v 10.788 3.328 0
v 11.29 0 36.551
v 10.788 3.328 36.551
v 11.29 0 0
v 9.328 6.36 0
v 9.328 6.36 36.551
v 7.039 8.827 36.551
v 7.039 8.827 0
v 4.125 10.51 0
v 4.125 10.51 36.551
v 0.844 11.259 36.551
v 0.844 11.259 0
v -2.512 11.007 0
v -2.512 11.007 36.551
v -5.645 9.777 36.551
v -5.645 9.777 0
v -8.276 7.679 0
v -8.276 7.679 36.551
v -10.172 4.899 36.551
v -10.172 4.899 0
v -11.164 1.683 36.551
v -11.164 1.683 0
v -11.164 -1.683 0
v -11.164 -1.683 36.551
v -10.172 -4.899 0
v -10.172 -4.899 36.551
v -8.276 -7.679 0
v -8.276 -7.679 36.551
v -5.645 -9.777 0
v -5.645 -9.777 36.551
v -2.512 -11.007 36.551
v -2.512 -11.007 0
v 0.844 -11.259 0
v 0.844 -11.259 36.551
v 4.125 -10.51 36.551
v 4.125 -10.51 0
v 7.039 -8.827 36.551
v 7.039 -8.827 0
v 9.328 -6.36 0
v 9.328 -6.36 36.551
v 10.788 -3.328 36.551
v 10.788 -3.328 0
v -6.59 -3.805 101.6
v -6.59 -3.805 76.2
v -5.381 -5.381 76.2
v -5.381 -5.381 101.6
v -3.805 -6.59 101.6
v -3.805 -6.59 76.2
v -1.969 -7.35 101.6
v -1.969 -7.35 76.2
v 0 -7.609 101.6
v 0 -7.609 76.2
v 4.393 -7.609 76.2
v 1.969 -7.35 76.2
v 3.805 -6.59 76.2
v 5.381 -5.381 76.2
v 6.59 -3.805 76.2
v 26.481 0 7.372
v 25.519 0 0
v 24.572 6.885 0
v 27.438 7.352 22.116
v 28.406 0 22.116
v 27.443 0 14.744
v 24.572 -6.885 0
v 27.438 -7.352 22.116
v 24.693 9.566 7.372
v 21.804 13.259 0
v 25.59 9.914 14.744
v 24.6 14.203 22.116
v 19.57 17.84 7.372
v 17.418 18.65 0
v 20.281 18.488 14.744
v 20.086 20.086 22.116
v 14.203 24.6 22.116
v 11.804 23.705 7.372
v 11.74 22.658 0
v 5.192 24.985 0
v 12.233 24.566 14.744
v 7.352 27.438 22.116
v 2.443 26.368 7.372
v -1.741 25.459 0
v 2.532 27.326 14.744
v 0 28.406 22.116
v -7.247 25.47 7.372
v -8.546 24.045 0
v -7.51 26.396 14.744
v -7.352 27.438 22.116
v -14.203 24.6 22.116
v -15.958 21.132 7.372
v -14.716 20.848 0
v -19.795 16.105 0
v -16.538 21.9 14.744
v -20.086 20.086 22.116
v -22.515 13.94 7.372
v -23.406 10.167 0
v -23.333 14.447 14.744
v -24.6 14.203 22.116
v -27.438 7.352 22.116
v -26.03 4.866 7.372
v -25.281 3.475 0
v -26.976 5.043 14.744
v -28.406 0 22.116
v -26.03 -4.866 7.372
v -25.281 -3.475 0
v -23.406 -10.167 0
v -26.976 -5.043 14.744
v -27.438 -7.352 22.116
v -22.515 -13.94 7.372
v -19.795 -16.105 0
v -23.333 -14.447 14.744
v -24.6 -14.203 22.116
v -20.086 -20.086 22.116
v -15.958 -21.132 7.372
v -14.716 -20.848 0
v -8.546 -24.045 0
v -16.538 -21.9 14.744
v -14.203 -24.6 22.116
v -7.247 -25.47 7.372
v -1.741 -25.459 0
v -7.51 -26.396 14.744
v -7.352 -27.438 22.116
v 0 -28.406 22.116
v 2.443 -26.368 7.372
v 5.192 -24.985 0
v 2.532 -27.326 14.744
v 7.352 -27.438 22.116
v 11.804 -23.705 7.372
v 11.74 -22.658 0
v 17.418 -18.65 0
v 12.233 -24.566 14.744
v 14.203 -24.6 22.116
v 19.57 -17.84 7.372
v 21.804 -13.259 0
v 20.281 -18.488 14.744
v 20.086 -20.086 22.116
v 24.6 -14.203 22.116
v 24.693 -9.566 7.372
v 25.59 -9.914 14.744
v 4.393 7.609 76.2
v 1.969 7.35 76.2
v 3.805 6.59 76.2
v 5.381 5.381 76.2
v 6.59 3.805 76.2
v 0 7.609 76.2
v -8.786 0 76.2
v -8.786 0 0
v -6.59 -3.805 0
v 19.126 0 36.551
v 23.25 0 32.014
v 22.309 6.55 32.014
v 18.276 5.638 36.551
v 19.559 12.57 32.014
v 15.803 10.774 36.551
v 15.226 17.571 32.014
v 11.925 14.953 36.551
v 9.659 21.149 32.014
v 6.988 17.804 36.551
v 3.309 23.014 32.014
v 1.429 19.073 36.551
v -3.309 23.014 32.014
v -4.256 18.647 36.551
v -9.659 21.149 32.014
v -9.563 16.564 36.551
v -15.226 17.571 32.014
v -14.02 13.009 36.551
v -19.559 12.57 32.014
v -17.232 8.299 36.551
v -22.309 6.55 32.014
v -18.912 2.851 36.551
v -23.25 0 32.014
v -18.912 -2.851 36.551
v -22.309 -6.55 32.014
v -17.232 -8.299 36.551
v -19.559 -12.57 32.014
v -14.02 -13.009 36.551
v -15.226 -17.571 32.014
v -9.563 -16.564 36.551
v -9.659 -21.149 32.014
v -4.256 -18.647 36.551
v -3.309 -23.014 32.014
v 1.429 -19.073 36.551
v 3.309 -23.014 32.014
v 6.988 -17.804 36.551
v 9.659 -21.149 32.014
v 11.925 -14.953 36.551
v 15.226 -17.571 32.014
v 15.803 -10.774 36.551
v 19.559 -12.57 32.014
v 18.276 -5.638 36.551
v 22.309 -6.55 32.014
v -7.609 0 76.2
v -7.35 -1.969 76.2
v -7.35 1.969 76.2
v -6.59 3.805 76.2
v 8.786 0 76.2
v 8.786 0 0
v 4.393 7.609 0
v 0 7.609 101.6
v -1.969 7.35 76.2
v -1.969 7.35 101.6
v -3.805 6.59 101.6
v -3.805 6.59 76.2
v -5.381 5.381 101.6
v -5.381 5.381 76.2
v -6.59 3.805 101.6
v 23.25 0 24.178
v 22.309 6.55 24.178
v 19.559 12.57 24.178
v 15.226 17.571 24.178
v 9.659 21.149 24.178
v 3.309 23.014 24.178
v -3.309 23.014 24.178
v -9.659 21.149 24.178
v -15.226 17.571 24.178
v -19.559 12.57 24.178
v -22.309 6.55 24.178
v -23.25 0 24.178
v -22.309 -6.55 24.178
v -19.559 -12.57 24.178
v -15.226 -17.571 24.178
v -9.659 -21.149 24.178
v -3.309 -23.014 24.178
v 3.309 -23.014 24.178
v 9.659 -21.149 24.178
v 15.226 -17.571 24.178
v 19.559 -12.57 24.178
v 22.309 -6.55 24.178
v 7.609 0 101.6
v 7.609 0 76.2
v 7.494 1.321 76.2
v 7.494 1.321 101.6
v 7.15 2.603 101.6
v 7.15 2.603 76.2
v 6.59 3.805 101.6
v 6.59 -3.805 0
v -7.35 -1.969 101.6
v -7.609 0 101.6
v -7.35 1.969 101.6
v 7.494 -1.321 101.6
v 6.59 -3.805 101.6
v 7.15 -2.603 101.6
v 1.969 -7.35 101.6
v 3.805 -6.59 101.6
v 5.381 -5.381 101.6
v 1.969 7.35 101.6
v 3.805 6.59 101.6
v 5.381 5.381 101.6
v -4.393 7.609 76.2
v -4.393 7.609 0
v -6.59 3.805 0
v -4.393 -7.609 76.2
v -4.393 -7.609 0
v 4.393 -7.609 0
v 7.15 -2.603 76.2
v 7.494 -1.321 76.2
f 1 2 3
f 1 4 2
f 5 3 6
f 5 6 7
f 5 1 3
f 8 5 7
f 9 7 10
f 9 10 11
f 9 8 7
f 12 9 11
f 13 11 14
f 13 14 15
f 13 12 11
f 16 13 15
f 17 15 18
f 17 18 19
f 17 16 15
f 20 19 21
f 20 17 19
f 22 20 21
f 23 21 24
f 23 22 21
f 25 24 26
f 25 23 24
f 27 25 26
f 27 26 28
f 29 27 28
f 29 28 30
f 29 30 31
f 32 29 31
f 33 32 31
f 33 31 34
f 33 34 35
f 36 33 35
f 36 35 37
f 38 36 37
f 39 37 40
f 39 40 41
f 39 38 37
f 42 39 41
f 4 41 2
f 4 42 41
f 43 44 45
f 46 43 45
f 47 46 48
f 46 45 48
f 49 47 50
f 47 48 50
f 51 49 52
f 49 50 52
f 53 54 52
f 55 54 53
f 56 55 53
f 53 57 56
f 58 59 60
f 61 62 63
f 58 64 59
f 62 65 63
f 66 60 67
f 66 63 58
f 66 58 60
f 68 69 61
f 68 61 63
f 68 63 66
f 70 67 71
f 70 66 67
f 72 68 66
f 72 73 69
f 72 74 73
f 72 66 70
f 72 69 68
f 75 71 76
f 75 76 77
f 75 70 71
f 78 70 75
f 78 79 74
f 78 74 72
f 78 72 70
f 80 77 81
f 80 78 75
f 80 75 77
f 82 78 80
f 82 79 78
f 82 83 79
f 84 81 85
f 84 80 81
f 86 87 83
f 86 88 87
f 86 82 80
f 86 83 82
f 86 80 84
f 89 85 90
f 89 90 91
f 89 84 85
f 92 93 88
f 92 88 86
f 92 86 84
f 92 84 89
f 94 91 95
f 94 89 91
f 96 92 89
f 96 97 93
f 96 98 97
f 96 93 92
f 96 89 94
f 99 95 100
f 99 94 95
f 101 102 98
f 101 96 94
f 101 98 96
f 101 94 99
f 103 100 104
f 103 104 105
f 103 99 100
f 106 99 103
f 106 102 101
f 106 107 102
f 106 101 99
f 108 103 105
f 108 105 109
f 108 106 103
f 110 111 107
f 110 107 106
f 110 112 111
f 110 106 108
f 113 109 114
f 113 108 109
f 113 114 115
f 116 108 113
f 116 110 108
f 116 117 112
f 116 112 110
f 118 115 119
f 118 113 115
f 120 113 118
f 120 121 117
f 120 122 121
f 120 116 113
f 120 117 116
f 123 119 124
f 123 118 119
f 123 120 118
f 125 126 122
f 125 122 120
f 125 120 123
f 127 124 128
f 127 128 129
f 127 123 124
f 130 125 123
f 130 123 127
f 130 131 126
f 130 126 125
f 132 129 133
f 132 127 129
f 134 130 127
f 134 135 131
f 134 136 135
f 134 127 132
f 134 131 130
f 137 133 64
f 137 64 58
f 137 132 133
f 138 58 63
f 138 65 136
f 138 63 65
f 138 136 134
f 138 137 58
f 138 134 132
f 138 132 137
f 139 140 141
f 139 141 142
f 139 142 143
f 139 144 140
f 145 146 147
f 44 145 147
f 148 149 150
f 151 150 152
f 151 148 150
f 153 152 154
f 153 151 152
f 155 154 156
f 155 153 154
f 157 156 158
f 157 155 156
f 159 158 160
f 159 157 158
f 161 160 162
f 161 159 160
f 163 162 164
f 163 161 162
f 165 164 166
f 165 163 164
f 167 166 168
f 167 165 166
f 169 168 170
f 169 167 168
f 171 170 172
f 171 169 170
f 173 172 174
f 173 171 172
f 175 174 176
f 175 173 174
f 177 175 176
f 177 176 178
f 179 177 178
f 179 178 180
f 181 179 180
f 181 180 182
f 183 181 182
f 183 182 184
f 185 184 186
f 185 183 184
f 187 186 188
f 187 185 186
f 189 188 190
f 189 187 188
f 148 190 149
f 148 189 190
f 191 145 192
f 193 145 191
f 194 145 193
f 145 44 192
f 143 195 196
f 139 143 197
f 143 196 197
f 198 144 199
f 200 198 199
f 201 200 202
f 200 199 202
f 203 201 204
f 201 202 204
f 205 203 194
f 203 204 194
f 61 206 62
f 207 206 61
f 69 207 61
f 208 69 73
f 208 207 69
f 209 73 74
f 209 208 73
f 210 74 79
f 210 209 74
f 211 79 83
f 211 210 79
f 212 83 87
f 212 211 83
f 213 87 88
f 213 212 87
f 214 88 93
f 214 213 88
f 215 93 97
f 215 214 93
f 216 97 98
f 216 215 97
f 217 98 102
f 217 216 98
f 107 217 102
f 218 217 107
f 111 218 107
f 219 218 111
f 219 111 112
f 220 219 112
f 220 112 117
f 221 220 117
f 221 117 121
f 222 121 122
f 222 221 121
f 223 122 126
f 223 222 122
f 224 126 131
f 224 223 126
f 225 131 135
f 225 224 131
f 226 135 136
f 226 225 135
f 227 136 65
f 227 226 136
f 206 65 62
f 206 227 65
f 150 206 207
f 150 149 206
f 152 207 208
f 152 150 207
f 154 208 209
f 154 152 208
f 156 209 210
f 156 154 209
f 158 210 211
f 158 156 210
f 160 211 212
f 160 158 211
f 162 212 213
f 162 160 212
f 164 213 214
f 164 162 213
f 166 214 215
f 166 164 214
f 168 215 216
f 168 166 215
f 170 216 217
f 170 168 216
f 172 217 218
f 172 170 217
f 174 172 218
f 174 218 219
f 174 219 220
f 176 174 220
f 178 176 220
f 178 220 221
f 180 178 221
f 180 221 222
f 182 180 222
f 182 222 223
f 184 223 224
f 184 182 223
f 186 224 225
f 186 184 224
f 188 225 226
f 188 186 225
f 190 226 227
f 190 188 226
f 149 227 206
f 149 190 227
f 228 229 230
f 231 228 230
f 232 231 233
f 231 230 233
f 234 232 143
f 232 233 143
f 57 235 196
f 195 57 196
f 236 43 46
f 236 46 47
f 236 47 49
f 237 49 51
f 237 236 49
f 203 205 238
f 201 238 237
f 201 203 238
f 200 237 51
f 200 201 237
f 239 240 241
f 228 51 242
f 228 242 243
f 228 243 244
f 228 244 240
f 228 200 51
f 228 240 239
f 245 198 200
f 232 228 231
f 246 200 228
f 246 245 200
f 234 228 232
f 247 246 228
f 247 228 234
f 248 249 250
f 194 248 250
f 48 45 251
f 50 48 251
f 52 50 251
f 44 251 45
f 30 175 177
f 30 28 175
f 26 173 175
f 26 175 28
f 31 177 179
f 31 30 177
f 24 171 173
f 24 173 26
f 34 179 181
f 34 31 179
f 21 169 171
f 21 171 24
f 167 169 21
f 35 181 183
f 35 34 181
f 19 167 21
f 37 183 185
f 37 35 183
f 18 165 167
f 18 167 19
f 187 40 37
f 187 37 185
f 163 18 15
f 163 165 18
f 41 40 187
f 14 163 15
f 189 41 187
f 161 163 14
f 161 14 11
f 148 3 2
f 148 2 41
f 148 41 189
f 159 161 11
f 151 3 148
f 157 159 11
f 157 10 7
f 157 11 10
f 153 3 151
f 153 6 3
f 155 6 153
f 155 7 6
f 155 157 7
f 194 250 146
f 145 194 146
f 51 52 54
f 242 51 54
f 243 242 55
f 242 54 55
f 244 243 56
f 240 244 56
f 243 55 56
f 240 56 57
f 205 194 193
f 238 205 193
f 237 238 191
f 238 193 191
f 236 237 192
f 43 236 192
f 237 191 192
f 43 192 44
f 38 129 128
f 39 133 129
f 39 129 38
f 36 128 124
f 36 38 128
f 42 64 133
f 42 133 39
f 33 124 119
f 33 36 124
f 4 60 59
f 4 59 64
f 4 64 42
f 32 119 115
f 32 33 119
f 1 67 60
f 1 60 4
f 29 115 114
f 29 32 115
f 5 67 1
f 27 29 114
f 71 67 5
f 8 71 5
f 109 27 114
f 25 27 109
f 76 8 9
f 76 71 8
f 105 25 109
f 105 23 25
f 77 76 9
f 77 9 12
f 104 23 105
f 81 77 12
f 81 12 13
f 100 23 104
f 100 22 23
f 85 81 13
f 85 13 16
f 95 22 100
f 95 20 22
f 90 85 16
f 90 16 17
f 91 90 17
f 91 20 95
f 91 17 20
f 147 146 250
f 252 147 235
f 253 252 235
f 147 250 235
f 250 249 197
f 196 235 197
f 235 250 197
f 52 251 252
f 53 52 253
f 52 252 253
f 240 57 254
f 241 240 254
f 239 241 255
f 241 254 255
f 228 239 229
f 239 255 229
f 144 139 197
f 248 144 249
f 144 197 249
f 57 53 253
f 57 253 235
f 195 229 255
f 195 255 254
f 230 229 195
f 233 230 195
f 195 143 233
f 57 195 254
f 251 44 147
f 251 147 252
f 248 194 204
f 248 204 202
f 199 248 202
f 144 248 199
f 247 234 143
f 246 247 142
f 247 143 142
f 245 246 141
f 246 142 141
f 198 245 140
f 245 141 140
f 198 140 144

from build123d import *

# Parameters (mm, degrees)
F3_DEPTH = 101.6
F4_DEPTH = 76.2


with BuildPart() as f1:
    # F0 (on Front) → F1 (revolve)
    with BuildSketch(Plane.XZ):
        Polygon((11.2900706008, 36.5509614348), (11.2900706008, 0), (25.5186520517, 0), (28.4056123346, 22.1161656082), (23.2503265142, 24.1782795638), (23.2503265142, 32.01431036), (19.1261023283, 36.5509614348), align=None)
    revolve(axis=Axis((0, 0, 21.5748623013), (0, 0, 1)))


with BuildPart() as f3:
    # F2 (on Top) → F3 (new body)
    with BuildSketch(Plane.XY):
        with BuildLine():
            ThreePointArc((6.5898312731, -3.8046407996), (7.3500017096, -1.9694269956), (7.6092816889, 0))
            ThreePointArc((7.6092816889, 0), (7.3500016803, 1.9694271048), (6.58983116, 3.8046409954))
            ThreePointArc((6.58983116, 3.8046409954), (3.804640769, 6.5898312907), (0, 7.6092816889))
            ThreePointArc((0, 7.6092816889), (-3.8046409197, 6.5898312037), (-6.5898313341, 3.804640694))
            ThreePointArc((-6.5898313341, 3.804640694), (-7.6092816889, 8.9e-09), (-6.589831343, -3.8046406786))
            ThreePointArc((-6.589831343, -3.8046406786), (-3.8046409274, -6.5898311993), (0, -7.6092816889))
            ThreePointArc((0, -7.6092816889), (3.8046408669, -6.5898312342), (6.5898312731, -3.8046407996))
        make_face()
    extrude(amount=F3_DEPTH)

    # F2 (on Top) → F4 (join)
    with BuildSketch(Plane.XY):
        with BuildLine():
            ThreePointArc((6.5898312731, -3.8046407996), (7.3500017096, -1.9694269956), (7.6092816889, 0))
            ThreePointArc((7.6092816889, 0), (7.3500016803, 1.9694271048), (6.58983116, 3.8046409954))
            ThreePointArc((6.58983116, 3.8046409954), (3.804640769, 6.5898312907), (0, 7.6092816889))
            ThreePointArc((0, 7.6092816889), (-3.8046409197, 6.5898312037), (-6.5898313341, 3.804640694))
            ThreePointArc((-6.5898313341, 3.804640694), (-7.6092816889, 8.9e-09), (-6.589831343, -3.8046406786))
            ThreePointArc((-6.589831343, -3.8046406786), (-3.8046409274, -6.5898311993), (0, -7.6092816889))
            ThreePointArc((0, -7.6092816889), (3.8046408669, -6.5898312342), (6.5898312731, -3.8046407996))
        make_face()
        with BuildLine():
            ThreePointArc((-6.5898313341, 3.804640694), (-3.8046409197, 6.5898312037), (0, 7.6092816889))
            Line((0, 7.6092816889), (-4.3932208314, 7.6092816889))
            Line((-4.3932208314, 7.6092816889), (-6.5898313341, 3.804640694))
        make_face()
        with BuildLine():
            ThreePointArc((0, 7.6092816889), (3.804640769, 6.5898312907), (6.58983116, 3.8046409954))
            Line((6.58983116, 3.8046409954), (4.3932208314, 7.6092816889))
            Line((4.3932208314, 7.6092816889), (0, 7.6092816889))
        make_face()
        with BuildLine():
            ThreePointArc((6.58983116, 3.8046409954), (7.3500016803, 1.9694271048), (7.6092816889, 0))
            ThreePointArc((7.6092816889, 0), (7.3500017096, -1.9694269956), (6.5898312731, -3.8046407996))
            Line((6.5898312731, -3.8046407996), (8.7864416629, 0))
            Line((8.7864416629, 0), (6.58983116, 3.8046409954))
        make_face()
        with BuildLine():
            Line((4.3932208314, -7.6092816889), (6.5898312731, -3.8046407996))
            ThreePointArc((6.5898312731, -3.8046407996), (3.8046408669, -6.5898312342), (0, -7.6092816889))
            Line((0, -7.6092816889), (4.3932208314, -7.6092816889))
        make_face()
        with BuildLine():
            Line((-4.3932208314, -7.6092816889), (0, -7.6092816889))
            ThreePointArc((0, -7.6092816889), (-3.8046409274, -6.5898311993), (-6.589831343, -3.8046406786))
            Line((-6.589831343, -3.8046406786), (-4.3932208314, -7.6092816889))
        make_face()
        with BuildLine():
            ThreePointArc((-6.589831343, -3.8046406786), (-7.6092816889, 8.9e-09), (-6.5898313341, 3.804640694))
            Line((-6.5898313341, 3.804640694), (-8.7864416629, 0))
            Line((-8.7864416629, 0), (-6.589831343, -3.8046406786))
        make_face()
    extrude(amount=F4_DEPTH)


solid = Compound([f1.part, f3.part])
